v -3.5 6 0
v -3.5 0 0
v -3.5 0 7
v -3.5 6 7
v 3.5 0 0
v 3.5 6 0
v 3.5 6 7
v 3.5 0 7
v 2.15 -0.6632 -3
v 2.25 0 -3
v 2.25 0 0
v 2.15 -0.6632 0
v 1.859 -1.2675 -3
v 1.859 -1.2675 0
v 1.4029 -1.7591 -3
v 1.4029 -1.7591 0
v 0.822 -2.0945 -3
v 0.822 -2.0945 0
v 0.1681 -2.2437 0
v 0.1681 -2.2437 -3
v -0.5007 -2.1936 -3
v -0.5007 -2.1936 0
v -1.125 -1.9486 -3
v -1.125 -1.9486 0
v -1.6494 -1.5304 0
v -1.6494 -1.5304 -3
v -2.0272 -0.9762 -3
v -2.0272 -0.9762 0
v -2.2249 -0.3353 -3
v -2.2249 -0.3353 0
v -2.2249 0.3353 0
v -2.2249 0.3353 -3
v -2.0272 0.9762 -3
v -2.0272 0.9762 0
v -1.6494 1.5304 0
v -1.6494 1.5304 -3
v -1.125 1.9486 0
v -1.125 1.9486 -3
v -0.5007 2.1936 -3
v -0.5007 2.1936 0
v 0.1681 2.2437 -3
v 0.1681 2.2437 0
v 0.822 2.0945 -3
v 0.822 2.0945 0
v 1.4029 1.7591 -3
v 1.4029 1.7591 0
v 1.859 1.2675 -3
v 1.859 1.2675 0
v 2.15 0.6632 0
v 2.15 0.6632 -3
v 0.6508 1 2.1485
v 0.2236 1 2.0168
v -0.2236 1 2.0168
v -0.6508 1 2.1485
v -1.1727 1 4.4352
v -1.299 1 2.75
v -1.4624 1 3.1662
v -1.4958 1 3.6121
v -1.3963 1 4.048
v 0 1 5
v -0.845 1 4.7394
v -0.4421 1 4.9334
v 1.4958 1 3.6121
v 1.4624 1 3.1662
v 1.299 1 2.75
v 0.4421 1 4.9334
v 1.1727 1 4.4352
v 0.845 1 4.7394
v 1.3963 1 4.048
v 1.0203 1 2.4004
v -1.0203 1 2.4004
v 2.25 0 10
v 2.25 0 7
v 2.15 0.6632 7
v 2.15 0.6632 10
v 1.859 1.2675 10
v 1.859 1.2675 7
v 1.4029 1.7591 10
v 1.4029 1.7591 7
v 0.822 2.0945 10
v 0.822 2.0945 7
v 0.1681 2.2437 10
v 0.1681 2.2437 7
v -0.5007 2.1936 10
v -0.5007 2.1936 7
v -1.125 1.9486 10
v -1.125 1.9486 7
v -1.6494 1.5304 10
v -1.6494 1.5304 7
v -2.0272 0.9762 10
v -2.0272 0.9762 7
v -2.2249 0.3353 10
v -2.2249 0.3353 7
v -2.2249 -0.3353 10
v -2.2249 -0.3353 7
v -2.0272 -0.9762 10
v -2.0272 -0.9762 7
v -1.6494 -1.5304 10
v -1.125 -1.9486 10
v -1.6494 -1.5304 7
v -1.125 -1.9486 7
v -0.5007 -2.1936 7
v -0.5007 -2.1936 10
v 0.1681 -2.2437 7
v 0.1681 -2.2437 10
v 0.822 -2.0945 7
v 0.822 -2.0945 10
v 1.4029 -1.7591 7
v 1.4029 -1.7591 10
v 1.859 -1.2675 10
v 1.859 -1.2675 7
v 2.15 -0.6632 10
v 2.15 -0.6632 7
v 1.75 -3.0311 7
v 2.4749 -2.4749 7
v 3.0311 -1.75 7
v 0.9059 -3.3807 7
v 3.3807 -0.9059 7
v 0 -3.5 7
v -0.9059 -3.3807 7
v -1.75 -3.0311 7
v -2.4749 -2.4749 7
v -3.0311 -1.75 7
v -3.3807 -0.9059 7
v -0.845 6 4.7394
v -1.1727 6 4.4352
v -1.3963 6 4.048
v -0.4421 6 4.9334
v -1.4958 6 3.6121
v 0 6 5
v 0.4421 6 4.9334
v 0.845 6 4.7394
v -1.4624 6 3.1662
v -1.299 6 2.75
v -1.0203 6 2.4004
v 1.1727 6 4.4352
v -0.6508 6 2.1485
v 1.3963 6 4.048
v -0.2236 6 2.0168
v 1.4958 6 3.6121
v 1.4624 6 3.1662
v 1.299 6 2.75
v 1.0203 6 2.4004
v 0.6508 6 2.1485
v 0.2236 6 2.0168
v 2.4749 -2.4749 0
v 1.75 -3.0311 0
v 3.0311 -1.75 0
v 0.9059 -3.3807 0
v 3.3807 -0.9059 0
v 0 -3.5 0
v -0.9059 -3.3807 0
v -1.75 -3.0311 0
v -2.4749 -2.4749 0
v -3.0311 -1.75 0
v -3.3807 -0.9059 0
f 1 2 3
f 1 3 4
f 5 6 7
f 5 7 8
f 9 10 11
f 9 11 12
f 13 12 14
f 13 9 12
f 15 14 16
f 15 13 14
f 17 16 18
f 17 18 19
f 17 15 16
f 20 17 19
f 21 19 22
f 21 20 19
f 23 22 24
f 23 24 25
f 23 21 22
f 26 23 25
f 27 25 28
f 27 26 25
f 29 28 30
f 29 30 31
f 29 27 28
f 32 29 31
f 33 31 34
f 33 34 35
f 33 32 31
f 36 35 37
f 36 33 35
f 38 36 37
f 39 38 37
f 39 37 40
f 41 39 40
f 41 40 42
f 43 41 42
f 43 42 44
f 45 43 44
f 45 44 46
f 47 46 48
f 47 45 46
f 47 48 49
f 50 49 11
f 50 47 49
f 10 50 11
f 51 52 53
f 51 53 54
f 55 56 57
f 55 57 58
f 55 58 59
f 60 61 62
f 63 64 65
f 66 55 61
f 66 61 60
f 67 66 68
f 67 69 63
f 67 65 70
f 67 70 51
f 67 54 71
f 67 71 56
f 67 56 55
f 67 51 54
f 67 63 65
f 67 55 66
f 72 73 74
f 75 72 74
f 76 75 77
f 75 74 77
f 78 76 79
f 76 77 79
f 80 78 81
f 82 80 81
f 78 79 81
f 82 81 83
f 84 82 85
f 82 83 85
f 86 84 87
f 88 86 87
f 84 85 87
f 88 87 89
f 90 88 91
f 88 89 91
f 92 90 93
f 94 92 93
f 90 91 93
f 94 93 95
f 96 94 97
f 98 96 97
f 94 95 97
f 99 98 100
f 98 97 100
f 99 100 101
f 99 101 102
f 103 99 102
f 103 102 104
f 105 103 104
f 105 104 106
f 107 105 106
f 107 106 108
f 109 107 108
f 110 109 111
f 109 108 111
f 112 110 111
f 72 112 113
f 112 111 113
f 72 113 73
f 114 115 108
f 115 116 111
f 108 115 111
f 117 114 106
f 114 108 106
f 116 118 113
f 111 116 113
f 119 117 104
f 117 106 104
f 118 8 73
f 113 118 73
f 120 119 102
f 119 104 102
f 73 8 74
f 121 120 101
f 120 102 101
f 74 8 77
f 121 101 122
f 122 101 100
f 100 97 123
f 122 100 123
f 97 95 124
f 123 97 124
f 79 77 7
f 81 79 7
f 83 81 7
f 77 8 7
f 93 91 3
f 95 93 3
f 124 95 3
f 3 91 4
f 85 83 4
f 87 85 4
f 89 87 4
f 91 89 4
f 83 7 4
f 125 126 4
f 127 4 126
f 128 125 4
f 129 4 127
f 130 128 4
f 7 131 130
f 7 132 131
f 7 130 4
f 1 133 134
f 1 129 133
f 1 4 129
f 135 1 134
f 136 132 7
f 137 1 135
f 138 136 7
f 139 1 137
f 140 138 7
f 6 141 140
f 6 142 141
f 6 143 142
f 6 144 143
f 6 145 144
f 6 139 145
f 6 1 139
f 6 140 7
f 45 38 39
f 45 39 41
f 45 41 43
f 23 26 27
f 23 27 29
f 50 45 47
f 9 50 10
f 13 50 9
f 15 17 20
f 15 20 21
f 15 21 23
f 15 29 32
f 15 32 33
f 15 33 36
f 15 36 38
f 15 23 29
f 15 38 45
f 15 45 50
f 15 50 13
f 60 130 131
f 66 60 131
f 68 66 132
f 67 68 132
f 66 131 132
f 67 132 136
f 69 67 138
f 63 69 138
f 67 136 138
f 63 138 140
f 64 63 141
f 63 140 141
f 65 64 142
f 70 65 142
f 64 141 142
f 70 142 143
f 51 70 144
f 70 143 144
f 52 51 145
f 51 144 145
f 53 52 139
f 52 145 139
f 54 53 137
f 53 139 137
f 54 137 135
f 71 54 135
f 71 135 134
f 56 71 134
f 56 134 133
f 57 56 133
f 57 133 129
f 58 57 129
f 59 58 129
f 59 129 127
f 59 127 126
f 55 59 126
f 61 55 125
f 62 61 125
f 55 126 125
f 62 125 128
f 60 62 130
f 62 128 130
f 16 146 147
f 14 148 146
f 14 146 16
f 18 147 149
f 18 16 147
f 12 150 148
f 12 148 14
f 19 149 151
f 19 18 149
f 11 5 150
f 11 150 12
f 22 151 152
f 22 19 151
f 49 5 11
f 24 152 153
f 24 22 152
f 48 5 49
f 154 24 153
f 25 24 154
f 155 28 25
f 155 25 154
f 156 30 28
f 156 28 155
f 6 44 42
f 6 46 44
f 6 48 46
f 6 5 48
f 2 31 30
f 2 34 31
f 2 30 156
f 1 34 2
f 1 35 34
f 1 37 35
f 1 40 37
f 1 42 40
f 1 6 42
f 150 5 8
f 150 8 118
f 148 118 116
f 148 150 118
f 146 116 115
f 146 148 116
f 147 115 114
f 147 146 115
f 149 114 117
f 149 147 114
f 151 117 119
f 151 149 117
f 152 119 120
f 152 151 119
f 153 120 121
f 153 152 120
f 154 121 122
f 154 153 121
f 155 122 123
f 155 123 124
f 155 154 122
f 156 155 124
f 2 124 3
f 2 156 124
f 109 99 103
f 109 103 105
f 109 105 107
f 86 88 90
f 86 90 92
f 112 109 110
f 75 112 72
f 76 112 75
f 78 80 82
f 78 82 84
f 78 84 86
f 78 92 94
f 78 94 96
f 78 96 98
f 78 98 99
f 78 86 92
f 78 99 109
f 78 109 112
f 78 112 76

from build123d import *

# Parameters (mm, degrees)
EXTRUDE_1_DEPTH     = 7
SKETCH_3_R          = 2.25
EXTRUDE_2_DEPTH     = 3
EXTRUDE_START       = 3
SKETCH_4_R          = 2.25
EXTRUDE_3_DEPTH     = 3
SKETCH_5_R          = 1.5
CUT_EXTRUDE_4_DEPTH = 5


with BuildPart() as part:
    # 草圖1 → 伸長1 (new body)
    with BuildSketch(Plane.XY):
        with BuildLine():
            Line((-3.5, 0), (-3.5, 6))
            Line((-3.5, 6), (3.5, 6))
            Line((3.5, 6), (3.5, 0))
            ThreePointArc((3.5, 0), (0, -3.5), (-3.5, 0))
        make_face()
    extrude(amount=EXTRUDE_1_DEPTH)

    # 草圖3 → 伸長2 (add)
    with BuildSketch(Plane.XY.offset(7)):
        Circle(SKETCH_3_R)
    extrude(amount=EXTRUDE_2_DEPTH)

    # 草圖4 → 伸長3 (add)
    with BuildSketch(Plane(origin=(0, 0, 0), x_dir=(-1, 0, 0), z_dir=(0, 0, -1)).offset(EXTRUDE_START)):
        with Locations(Location((0, 0, 0), (0, 0, 180))):
            Circle(SKETCH_4_R)
    extrude(amount=-EXTRUDE_3_DEPTH)

    # 草圖5 → 伸長4 (cut)
    with BuildSketch(Plane(origin=(0, 6, 0), x_dir=(1, 0, 0), z_dir=(0, 1, 0))):
        with Locations(Location((0, -3.5, 0), (0, 0, 270))):
            Circle(SKETCH_5_R)
    extrude(amount=-CUT_EXTRUDE_4_DEPTH, mode=Mode.SUBTRACT)


solid = part.part
